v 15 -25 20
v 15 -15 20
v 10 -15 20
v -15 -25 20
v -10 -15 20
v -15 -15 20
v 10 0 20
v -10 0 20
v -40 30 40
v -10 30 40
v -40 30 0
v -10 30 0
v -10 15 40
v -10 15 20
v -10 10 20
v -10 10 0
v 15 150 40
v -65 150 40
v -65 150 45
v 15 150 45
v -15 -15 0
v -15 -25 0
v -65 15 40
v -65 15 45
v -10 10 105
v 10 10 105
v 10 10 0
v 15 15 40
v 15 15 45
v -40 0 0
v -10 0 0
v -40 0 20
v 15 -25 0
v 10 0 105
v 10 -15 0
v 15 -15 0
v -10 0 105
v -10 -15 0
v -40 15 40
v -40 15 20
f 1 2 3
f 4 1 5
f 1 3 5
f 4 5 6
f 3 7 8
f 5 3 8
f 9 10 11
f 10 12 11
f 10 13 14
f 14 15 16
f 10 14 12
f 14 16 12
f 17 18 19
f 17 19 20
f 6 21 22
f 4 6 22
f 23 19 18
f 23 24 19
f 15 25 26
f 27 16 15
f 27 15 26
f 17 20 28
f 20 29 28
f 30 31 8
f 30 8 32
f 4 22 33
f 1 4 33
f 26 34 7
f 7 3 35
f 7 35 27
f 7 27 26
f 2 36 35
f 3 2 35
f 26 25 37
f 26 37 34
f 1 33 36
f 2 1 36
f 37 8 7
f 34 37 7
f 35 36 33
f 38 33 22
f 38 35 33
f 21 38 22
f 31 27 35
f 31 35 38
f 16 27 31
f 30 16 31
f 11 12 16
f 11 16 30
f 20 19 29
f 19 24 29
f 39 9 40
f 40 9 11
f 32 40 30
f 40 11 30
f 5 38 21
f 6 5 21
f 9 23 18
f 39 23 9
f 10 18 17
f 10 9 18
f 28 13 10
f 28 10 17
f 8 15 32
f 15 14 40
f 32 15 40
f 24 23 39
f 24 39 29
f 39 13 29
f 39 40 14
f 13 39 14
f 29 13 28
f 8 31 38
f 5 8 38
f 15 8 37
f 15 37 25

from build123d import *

# Parameters (mm, degrees)
BOSS_EXTRUDE1_DEPTH = 20
BOSS_EXTRUDE2_DEPTH = 20
SKETCH3_W           = 20
SKETCH3_H           = 10
BOSS_EXTRUDE3_DEPTH = 85
SKETCH6_W           = 80
SKETCH6_H           = 85
BOSS_EXTRUDE4_DEPTH = 25
SKETCH7_W           = 30
SKETCH7_H           = 20
CUT_EXTRUDE1_DEPTH  = 70
CUT_EXTRUDE2_DEPTH  = 20
SKETCH9_W           = 80
SKETCH9_H           = 5
BOSS_EXTRUDE5_DEPTH = 50


with BuildPart() as part:
    # Sketch1 → Boss-Extrude1 (new body)
    with BuildSketch(Plane.XY):
        Polygon((10, 0), (-10, 0), (-10, -15), (-15, -15), (-15, -25), (15, -25), (15, -15), (10, -15), align=None)
    extrude(amount=BOSS_EXTRUDE1_DEPTH)

    # Sketch2 → Boss-Extrude2 (add)
    with BuildSketch(Plane(origin=(0, 0, 0), x_dir=(-1, 0, 0), z_dir=(0, 0, -1))):
        Polygon((10, 0), (40, 0), (40, 100), (10, 100), (10, 10), (-10, 10), (-10, 0), align=None)
    extrude(amount=-BOSS_EXTRUDE2_DEPTH)

    # Sketch3 → Boss-Extrude3 (add)
    with BuildSketch(Plane.XY.offset(20)):
        with Locations((0, 5)):
            Rectangle(SKETCH3_W, SKETCH3_H)
    extrude(amount=BOSS_EXTRUDE3_DEPTH)

    # Sketch6 → Boss-Extrude4 (add)
    with BuildSketch(Plane.XY.offset(20)):
        with Locations((-25, 57.5)):
            Rectangle(SKETCH6_W, SKETCH6_H)
    extrude(amount=BOSS_EXTRUDE4_DEPTH)

    # Sketch7 → Cut-Extrude1 (cut)
    with BuildSketch(Plane(origin=(0, 100, 0), x_dir=(1, 0, 0), z_dir=(0, 1, 0))):
        with Locations((-25, -10)):
            Rectangle(SKETCH7_W, SKETCH7_H)
    extrude(amount=-CUT_EXTRUDE1_DEPTH, mode=Mode.SUBTRACT)

    # Sketch8 → Cut-Extrude2 (cut)
    with BuildSketch(Plane(origin=(0, 0, 20), x_dir=(-1, 0, 0), z_dir=(0, 0, -1))):
        Polygon((40, 30), (40, 15), (65, 15), (65, 100), (-15, 100), (-15, 15), (10, 15), (10, 30), align=None)
    extrude(amount=-CUT_EXTRUDE2_DEPTH, mode=Mode.SUBTRACT)

    # Sketch9 → Boss-Extrude5 (add)
    with BuildSketch(Plane(origin=(0, 100, 0), x_dir=(1, 0, 0), z_dir=(0, 1, 0))):
        with Locations((-25, -42.5)):
            Rectangle(SKETCH9_W, SKETCH9_H)
    extrude(amount=BOSS_EXTRUDE5_DEPTH)


solid = part.part
